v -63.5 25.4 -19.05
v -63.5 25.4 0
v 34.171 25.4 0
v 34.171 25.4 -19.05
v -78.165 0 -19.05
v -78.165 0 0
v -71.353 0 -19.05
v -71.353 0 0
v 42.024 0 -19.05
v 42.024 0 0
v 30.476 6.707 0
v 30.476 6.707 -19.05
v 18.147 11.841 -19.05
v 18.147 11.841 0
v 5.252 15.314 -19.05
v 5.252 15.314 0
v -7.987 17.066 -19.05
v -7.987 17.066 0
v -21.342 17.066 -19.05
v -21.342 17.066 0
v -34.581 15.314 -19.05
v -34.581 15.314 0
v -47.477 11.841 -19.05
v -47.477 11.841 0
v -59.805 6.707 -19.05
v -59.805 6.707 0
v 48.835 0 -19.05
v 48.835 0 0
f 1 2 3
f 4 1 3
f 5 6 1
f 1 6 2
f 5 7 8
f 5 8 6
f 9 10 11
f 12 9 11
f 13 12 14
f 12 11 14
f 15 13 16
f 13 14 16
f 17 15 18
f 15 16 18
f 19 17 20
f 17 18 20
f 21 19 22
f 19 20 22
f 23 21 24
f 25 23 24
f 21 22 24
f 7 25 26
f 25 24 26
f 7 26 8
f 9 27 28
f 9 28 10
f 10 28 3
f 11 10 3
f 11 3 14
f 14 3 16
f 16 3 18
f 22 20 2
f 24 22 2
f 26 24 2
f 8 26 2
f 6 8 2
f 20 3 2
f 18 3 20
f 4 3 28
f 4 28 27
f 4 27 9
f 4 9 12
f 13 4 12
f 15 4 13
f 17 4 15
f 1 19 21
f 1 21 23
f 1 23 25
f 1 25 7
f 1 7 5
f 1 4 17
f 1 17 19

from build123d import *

# Parameters (mm, degrees)
BOSS_EXTRUDE1_DEPTH = 19.05
SKETCH2_W           = 119.77527386
SKETCH2_H           = 145.609156457
CUT_EXTRUDE1_DEPTH  = 25.4
SKETCH3_R           = 101.6
CUT_EXTRUDE2_DEPTH  = 85.36695047


with BuildPart() as part:
    # Sketch1 → Boss-Extrude1 (new body)
    with BuildSketch(Plane.XY):
        Polygon((-78.164696837, 0), (-63.5, 25.4), (63.5, 25.4), (78.164696837, 0), align=None)
    extrude(amount=-BOSS_EXTRUDE1_DEPTH)

    # Sketch2 → Cut-Extrude1 (cut)
    with BuildSketch(Plane(origin=(58.623522628, 33.84630657, 0), x_dir=(0, 0, -1), z_dir=(0.866025403784436, 0.5000000000000047, 0))):
        with Locations((20.492508396, -22.352934086)):
            Rectangle(SKETCH2_W, SKETCH2_H)
    extrude(amount=-CUT_EXTRUDE1_DEPTH, mode=Mode.SUBTRACT)

    # Sketch3 → Cut-Extrude2 (cut, through all)
    with BuildSketch(Plane.XY):
        with Locations((-14.664696837, -84.31457873)):
            Circle(SKETCH3_R)
    extrude(amount=-CUT_EXTRUDE2_DEPTH, mode=Mode.SUBTRACT)


solid = part.part
